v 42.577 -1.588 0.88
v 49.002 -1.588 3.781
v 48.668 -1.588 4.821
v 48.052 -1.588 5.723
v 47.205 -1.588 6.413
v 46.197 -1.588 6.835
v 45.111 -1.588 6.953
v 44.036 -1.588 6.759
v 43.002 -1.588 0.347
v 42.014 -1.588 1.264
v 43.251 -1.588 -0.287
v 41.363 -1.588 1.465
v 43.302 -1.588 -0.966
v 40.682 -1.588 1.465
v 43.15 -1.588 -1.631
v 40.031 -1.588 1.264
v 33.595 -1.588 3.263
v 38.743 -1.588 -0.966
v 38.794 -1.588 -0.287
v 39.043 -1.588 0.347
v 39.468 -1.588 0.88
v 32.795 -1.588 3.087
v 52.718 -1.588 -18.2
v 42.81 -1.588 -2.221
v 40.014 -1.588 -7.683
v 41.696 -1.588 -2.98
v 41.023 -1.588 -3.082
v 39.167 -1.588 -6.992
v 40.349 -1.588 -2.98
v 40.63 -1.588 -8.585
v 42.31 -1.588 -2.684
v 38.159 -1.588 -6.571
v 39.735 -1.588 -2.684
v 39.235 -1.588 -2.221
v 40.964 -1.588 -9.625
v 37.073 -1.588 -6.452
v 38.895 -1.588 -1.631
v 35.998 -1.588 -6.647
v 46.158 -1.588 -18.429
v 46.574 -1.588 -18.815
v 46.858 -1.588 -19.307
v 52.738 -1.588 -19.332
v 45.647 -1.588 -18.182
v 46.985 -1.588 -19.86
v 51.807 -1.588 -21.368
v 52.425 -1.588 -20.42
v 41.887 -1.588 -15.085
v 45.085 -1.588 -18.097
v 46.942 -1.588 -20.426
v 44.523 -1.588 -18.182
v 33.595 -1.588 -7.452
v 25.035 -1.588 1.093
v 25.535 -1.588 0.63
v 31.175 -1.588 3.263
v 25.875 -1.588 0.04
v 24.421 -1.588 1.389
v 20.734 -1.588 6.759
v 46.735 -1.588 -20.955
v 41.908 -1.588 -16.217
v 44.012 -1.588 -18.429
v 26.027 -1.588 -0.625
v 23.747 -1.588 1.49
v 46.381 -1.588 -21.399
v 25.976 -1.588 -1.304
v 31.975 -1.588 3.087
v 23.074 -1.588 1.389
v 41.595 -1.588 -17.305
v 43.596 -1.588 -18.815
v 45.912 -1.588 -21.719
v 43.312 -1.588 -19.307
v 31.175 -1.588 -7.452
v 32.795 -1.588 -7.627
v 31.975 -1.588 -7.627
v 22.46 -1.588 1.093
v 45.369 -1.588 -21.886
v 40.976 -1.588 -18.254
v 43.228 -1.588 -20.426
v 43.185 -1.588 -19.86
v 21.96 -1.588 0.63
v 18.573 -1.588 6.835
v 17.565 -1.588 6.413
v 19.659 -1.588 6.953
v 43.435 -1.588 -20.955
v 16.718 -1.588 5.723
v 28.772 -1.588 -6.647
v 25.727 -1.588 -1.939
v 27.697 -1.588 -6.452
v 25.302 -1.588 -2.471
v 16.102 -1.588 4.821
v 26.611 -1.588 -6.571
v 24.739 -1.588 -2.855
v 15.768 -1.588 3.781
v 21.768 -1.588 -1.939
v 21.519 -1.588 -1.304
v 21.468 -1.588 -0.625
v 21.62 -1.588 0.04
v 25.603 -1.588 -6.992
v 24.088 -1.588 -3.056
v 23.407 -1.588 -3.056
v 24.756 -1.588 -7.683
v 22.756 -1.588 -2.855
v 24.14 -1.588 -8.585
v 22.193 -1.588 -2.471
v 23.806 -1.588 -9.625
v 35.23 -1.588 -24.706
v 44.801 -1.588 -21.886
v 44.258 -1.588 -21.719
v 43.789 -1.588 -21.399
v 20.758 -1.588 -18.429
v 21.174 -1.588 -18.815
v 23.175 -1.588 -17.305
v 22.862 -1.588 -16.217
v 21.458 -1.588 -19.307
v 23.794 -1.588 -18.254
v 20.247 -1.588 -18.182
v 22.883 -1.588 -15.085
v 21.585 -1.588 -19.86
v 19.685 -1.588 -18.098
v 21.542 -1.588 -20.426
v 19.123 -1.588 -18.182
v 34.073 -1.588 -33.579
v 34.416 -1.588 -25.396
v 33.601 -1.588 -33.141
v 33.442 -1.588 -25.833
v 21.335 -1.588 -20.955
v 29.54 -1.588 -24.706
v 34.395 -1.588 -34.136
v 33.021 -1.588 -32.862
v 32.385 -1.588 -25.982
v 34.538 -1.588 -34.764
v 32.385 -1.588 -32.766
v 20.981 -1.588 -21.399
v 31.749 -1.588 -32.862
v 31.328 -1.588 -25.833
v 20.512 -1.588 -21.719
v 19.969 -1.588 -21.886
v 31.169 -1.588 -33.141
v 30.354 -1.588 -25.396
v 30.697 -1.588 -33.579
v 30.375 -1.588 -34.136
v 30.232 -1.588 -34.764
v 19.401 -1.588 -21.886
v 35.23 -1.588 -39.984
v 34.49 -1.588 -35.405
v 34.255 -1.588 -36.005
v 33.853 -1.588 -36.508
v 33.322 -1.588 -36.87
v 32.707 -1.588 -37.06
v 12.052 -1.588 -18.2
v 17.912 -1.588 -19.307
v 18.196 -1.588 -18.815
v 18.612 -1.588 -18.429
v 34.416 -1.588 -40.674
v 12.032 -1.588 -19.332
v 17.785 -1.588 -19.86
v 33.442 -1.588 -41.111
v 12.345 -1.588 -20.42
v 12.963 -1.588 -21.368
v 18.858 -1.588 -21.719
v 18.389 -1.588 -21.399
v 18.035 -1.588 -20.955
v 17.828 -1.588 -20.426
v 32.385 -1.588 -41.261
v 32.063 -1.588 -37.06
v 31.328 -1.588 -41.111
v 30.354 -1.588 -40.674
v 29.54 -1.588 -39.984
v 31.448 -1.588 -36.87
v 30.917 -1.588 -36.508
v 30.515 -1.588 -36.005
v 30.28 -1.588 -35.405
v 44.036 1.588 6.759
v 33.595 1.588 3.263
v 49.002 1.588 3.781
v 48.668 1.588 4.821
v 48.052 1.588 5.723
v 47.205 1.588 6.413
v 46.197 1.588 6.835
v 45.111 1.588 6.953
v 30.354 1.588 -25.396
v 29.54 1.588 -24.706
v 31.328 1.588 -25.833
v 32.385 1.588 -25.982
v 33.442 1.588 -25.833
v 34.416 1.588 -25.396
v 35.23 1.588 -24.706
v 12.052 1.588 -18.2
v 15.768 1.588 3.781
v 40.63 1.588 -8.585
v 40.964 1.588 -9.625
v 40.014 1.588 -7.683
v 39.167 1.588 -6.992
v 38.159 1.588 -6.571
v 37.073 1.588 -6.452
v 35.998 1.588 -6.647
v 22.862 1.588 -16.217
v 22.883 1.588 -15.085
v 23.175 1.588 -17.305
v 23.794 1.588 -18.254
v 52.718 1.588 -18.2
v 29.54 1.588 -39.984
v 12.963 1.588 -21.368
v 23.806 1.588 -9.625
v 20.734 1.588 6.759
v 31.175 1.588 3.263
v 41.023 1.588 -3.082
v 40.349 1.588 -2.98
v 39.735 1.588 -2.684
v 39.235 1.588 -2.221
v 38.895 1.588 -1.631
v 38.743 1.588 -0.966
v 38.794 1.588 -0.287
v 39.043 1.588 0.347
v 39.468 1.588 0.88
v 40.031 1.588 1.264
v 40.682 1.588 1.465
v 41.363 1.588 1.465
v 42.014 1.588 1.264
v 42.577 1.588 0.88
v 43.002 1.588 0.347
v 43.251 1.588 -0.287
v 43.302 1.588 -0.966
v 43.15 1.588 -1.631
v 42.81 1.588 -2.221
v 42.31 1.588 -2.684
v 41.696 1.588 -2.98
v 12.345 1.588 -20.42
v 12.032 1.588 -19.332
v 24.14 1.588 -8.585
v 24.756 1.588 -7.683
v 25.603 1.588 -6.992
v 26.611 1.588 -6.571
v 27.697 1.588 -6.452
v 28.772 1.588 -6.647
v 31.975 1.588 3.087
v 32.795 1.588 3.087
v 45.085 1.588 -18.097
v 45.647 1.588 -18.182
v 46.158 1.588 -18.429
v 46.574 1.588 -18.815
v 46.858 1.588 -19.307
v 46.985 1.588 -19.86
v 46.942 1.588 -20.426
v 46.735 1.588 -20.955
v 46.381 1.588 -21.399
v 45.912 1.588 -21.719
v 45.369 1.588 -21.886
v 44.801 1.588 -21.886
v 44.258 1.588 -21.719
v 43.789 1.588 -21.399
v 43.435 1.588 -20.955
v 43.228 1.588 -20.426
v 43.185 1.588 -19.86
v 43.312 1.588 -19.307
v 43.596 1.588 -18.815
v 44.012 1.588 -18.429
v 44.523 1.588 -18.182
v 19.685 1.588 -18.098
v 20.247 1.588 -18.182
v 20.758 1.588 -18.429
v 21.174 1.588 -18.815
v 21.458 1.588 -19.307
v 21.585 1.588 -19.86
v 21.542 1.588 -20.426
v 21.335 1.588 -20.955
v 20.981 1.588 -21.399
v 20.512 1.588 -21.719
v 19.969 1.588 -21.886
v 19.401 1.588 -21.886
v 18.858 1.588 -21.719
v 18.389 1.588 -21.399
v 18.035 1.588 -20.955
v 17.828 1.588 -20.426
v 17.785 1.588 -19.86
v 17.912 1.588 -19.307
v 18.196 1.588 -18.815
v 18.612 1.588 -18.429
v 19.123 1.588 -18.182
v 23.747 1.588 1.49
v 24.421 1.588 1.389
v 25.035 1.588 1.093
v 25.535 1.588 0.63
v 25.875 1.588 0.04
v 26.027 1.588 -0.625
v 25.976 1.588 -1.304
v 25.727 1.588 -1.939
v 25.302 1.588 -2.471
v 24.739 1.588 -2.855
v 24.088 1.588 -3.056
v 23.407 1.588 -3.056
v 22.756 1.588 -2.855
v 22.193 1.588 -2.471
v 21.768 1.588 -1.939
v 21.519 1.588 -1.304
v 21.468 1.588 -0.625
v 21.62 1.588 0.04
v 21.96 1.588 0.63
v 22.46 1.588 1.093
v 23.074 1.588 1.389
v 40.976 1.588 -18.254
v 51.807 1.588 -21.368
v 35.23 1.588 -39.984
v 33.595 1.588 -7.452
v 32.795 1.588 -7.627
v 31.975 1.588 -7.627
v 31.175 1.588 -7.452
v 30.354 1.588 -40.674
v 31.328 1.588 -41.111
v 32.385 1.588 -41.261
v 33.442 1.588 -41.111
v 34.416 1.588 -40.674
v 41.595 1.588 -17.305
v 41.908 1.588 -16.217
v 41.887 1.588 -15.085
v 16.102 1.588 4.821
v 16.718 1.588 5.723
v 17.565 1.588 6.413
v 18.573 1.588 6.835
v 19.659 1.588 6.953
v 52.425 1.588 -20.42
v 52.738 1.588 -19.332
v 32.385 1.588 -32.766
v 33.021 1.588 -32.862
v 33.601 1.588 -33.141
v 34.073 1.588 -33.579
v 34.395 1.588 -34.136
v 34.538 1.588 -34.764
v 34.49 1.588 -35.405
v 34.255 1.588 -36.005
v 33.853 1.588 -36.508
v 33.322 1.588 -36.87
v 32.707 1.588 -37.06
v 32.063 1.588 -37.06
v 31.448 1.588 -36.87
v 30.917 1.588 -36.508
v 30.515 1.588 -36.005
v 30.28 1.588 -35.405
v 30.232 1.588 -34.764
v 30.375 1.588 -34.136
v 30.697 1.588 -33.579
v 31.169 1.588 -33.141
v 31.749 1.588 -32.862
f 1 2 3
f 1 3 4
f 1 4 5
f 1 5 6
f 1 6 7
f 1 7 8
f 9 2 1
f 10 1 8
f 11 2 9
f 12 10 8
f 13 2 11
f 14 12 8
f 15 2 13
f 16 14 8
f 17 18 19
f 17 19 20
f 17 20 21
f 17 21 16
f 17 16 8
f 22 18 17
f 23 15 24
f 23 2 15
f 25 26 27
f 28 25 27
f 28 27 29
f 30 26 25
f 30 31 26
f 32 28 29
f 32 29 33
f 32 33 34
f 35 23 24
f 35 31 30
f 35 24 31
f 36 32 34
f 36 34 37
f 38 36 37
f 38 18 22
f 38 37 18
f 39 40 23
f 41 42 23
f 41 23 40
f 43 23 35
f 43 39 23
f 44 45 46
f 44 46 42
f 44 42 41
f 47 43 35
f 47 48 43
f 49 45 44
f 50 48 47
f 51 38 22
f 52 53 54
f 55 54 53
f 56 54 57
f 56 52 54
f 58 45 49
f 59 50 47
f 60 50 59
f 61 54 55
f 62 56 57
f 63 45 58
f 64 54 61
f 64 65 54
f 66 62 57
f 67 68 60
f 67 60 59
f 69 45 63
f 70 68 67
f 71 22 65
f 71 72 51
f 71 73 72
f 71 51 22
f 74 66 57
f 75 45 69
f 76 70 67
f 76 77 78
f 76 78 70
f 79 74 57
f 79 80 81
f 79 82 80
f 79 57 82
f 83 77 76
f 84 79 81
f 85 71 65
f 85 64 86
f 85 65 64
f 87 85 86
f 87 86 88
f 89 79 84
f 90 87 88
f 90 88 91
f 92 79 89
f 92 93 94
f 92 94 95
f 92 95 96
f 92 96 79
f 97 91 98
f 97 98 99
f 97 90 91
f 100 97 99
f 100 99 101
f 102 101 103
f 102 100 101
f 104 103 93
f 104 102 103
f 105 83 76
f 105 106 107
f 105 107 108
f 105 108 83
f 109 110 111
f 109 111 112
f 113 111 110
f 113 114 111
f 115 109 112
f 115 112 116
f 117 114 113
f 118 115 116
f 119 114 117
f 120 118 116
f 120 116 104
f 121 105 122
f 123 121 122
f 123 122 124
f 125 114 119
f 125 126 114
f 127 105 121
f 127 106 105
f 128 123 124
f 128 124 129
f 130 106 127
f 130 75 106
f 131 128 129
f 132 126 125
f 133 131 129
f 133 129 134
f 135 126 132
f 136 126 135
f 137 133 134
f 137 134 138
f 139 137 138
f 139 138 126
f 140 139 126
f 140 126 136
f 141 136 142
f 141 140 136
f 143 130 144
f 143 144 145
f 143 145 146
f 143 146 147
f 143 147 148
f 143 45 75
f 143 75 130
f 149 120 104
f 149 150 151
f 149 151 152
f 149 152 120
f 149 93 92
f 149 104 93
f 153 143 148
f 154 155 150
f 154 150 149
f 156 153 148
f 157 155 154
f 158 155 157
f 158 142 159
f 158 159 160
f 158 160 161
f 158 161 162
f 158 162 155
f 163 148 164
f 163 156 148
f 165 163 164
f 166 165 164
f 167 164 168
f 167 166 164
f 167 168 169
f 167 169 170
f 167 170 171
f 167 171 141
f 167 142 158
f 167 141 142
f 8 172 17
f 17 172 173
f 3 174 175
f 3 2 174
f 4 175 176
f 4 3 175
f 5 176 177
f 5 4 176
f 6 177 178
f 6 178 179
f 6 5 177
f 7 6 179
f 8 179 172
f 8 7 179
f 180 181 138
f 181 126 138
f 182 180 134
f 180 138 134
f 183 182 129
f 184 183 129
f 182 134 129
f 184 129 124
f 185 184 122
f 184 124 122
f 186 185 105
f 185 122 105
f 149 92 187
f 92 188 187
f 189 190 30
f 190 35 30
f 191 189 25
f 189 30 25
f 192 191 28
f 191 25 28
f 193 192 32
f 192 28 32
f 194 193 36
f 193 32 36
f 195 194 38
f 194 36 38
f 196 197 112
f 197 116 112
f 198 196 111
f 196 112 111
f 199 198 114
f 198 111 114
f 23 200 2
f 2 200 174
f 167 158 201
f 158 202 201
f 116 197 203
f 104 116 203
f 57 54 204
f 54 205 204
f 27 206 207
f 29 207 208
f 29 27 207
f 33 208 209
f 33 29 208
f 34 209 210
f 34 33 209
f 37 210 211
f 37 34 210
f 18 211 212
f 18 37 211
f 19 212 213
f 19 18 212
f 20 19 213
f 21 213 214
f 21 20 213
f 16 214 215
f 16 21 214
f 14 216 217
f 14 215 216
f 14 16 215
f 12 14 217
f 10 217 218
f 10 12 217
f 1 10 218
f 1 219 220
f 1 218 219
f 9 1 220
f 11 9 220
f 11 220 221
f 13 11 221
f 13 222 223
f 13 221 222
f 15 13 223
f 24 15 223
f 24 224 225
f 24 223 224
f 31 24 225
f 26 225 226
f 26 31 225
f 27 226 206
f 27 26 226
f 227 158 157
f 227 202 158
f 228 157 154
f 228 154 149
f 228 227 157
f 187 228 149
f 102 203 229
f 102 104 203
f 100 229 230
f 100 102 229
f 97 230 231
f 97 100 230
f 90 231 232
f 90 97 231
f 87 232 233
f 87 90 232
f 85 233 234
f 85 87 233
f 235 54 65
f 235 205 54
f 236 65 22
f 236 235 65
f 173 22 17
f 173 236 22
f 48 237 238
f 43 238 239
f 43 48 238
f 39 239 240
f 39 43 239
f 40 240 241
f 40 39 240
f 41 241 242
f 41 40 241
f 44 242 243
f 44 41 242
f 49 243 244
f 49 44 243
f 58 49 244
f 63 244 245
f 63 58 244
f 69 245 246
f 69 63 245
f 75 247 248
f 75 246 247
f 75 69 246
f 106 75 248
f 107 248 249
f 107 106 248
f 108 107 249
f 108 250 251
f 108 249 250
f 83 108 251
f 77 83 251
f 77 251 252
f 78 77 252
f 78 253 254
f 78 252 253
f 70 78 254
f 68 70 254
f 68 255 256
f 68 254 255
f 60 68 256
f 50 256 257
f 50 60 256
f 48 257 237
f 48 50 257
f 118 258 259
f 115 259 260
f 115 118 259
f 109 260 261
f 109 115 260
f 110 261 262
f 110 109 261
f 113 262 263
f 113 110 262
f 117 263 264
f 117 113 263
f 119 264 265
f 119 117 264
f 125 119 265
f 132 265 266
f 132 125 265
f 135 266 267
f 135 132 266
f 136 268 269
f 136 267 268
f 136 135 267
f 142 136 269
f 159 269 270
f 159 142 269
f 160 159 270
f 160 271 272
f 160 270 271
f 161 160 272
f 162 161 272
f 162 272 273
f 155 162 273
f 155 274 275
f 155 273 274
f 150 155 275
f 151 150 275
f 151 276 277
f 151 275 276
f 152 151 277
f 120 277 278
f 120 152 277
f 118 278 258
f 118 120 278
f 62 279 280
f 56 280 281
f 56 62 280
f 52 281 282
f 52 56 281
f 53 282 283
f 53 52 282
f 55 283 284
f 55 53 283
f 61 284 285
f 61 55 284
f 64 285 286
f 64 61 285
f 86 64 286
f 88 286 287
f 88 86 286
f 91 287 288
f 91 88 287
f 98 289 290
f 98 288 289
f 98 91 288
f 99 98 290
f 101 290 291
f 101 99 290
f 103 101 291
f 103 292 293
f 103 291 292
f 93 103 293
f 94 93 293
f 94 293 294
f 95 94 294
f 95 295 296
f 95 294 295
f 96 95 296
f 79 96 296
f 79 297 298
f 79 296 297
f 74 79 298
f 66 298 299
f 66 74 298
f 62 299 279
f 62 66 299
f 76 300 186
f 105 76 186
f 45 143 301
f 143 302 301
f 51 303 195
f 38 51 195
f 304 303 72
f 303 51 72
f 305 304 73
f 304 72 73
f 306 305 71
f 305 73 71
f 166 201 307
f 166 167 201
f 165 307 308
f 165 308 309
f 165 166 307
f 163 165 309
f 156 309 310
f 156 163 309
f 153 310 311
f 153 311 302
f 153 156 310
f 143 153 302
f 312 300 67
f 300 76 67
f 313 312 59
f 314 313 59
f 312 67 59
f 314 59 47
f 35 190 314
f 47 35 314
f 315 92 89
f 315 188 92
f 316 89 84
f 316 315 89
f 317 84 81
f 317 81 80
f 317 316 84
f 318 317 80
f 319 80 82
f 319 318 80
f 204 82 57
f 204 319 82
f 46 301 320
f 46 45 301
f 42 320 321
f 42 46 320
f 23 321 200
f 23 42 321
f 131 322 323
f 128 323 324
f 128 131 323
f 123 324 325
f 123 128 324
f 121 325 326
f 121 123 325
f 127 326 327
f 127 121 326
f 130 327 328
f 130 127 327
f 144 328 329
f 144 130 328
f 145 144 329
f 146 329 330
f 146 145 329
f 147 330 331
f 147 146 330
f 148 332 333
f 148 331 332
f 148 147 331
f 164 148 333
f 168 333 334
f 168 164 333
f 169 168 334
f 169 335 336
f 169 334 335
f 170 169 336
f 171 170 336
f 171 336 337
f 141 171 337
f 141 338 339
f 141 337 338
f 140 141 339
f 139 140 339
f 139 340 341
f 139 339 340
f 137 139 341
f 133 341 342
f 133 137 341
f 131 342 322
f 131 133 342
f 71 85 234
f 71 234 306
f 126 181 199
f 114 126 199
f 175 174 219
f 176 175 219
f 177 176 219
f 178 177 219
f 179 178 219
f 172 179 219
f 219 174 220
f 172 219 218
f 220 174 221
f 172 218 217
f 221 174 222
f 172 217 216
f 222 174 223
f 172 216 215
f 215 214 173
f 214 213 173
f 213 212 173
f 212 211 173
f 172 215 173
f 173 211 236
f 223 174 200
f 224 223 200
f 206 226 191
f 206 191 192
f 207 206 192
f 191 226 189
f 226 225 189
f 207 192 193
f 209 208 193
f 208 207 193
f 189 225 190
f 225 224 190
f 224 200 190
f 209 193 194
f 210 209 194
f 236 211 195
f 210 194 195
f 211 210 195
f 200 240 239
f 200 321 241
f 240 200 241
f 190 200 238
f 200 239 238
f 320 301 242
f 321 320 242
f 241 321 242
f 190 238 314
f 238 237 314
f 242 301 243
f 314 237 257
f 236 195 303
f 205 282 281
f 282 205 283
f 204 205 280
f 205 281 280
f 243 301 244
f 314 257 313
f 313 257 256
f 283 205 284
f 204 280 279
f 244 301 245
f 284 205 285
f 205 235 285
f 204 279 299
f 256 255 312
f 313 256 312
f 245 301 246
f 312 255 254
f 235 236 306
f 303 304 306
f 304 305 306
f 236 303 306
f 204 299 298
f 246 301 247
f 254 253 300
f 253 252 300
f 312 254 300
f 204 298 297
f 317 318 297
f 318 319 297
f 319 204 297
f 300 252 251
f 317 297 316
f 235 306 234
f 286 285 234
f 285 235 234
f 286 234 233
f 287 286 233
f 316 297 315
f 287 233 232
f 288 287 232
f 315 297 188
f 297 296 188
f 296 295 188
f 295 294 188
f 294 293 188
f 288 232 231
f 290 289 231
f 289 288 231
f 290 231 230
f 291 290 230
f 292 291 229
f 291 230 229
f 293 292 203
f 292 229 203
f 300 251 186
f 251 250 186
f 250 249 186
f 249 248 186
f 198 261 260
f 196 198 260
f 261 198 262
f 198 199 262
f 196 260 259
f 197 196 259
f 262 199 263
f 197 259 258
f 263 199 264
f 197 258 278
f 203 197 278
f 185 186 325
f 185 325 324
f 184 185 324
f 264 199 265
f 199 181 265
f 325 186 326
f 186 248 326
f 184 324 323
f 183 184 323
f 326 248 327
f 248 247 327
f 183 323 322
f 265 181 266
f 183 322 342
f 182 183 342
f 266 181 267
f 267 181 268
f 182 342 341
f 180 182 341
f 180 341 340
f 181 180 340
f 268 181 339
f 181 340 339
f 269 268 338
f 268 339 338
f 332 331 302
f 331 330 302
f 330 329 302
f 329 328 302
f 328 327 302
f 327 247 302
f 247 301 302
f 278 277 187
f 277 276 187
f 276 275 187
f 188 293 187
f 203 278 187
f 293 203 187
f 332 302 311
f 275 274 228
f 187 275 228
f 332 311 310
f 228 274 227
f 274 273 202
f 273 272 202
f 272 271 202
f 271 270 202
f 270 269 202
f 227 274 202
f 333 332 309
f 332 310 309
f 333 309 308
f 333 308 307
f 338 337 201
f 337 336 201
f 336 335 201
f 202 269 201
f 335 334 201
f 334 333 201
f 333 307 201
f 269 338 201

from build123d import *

# Parameters (mm, degrees)
BOSS_EXTRUDE1_DEPTH = 1.5875
SKETCH2_R           = 1.905000001
SKETCH2_R_2         = 1.905000002
SKETCH2_R_3         = 2.159000002
SKETCH2_R_4         = 2.286
CUT_EXTRUDE1_DEPTH  = 69.454207549
CUT_EXTRUDE3_DEPTH  = 69.454207549
FILLET2_R           = 3.81


with BuildPart() as part:
    # Sketch1 → Boss-Extrude1 (new, symmetric)
    with BuildSketch(Plane(origin=(0, 0, 0), x_dir=(1, 0, 0), z_dir=(0, 1, 0))):
        Polygon((11.747500001, 20.002499998), (32.385000001, 43.179999998), (53.022500001, 20.002499998), (48.260000001, -8.172829969), (32.385000001, -2.857500002), (16.510000001, -8.172829969), align=None)
    extrude(amount=BOSS_EXTRUDE1_DEPTH, both=True)

    # Sketch2 → Cut-Extrude1 (cut, through all)
    with BuildSketch(Plane(origin=(0, -1.5875, 0), x_dir=(1, 0, 0), z_dir=(0, 1, 0))):
        with Locations(Location((19.684999998, 20.002500002, 0), (0, 0, 270))):
            Circle(SKETCH2_R)
        with Locations(Location((45.084999998, 20.0025, 0), (0, 0, 270))):
            Circle(SKETCH2_R_2)
        with Locations(Location((32.385000001, 34.925000025, 0), (0, 0, 270))):
            Circle(SKETCH2_R_3)
        with Locations(Location((23.747482722, 0.795511849, 0), (0, 0, 270))):
            Circle(SKETCH2_R_4)
        with Locations(Location((41.022517279, 0.795511849, 0), (0, 0, 90))):
            Circle(SKETCH2_R_4)
    extrude(amount=CUT_EXTRUDE1_DEPTH, mode=Mode.SUBTRACT)

    # Sketch4 → Cut-Extrude3 (cut, through all)
    with BuildSketch(Plane(origin=(0, 1.5875, 0), x_dir=(1, 0, 0), z_dir=(0, 1, 0))):
        Polygon((22.578091019, 16.887859433), (24.548137073, 5.232909805), (32.385000001, 7.856879088), (40.221862929, 5.232909805), (42.191908982, 16.887859433), (32.385000001, 27.901772597), align=None)
    extrude(amount=-CUT_EXTRUDE3_DEPTH, mode=Mode.SUBTRACT)

    # Fillet2
    fillet2_edges = [part.edges().sort_by_distance(p)[0] for p in [
        (53.022500001, 0, -20.002499998),
        (48.260000001, 0, 8.172829969),
        (32.385000001, 0, 2.857500002),
        (16.510000001, 0, 8.172829969),
        (11.747500001, 0, -20.002499998),
        (32.385000001, 0, -43.179999998),
        (22.578091019, 0, -16.887859433),
        (32.385000001, 0, -27.901772597),
        (42.191908982, 0, -16.887859433),
        (40.221862929, 0, -5.232909805),
        (32.385000001, 0, -7.856879088),
        (24.548137073, 0, -5.232909805),
    ]]
    fillet(fillet2_edges, radius=FILLET2_R)


solid = part.part
